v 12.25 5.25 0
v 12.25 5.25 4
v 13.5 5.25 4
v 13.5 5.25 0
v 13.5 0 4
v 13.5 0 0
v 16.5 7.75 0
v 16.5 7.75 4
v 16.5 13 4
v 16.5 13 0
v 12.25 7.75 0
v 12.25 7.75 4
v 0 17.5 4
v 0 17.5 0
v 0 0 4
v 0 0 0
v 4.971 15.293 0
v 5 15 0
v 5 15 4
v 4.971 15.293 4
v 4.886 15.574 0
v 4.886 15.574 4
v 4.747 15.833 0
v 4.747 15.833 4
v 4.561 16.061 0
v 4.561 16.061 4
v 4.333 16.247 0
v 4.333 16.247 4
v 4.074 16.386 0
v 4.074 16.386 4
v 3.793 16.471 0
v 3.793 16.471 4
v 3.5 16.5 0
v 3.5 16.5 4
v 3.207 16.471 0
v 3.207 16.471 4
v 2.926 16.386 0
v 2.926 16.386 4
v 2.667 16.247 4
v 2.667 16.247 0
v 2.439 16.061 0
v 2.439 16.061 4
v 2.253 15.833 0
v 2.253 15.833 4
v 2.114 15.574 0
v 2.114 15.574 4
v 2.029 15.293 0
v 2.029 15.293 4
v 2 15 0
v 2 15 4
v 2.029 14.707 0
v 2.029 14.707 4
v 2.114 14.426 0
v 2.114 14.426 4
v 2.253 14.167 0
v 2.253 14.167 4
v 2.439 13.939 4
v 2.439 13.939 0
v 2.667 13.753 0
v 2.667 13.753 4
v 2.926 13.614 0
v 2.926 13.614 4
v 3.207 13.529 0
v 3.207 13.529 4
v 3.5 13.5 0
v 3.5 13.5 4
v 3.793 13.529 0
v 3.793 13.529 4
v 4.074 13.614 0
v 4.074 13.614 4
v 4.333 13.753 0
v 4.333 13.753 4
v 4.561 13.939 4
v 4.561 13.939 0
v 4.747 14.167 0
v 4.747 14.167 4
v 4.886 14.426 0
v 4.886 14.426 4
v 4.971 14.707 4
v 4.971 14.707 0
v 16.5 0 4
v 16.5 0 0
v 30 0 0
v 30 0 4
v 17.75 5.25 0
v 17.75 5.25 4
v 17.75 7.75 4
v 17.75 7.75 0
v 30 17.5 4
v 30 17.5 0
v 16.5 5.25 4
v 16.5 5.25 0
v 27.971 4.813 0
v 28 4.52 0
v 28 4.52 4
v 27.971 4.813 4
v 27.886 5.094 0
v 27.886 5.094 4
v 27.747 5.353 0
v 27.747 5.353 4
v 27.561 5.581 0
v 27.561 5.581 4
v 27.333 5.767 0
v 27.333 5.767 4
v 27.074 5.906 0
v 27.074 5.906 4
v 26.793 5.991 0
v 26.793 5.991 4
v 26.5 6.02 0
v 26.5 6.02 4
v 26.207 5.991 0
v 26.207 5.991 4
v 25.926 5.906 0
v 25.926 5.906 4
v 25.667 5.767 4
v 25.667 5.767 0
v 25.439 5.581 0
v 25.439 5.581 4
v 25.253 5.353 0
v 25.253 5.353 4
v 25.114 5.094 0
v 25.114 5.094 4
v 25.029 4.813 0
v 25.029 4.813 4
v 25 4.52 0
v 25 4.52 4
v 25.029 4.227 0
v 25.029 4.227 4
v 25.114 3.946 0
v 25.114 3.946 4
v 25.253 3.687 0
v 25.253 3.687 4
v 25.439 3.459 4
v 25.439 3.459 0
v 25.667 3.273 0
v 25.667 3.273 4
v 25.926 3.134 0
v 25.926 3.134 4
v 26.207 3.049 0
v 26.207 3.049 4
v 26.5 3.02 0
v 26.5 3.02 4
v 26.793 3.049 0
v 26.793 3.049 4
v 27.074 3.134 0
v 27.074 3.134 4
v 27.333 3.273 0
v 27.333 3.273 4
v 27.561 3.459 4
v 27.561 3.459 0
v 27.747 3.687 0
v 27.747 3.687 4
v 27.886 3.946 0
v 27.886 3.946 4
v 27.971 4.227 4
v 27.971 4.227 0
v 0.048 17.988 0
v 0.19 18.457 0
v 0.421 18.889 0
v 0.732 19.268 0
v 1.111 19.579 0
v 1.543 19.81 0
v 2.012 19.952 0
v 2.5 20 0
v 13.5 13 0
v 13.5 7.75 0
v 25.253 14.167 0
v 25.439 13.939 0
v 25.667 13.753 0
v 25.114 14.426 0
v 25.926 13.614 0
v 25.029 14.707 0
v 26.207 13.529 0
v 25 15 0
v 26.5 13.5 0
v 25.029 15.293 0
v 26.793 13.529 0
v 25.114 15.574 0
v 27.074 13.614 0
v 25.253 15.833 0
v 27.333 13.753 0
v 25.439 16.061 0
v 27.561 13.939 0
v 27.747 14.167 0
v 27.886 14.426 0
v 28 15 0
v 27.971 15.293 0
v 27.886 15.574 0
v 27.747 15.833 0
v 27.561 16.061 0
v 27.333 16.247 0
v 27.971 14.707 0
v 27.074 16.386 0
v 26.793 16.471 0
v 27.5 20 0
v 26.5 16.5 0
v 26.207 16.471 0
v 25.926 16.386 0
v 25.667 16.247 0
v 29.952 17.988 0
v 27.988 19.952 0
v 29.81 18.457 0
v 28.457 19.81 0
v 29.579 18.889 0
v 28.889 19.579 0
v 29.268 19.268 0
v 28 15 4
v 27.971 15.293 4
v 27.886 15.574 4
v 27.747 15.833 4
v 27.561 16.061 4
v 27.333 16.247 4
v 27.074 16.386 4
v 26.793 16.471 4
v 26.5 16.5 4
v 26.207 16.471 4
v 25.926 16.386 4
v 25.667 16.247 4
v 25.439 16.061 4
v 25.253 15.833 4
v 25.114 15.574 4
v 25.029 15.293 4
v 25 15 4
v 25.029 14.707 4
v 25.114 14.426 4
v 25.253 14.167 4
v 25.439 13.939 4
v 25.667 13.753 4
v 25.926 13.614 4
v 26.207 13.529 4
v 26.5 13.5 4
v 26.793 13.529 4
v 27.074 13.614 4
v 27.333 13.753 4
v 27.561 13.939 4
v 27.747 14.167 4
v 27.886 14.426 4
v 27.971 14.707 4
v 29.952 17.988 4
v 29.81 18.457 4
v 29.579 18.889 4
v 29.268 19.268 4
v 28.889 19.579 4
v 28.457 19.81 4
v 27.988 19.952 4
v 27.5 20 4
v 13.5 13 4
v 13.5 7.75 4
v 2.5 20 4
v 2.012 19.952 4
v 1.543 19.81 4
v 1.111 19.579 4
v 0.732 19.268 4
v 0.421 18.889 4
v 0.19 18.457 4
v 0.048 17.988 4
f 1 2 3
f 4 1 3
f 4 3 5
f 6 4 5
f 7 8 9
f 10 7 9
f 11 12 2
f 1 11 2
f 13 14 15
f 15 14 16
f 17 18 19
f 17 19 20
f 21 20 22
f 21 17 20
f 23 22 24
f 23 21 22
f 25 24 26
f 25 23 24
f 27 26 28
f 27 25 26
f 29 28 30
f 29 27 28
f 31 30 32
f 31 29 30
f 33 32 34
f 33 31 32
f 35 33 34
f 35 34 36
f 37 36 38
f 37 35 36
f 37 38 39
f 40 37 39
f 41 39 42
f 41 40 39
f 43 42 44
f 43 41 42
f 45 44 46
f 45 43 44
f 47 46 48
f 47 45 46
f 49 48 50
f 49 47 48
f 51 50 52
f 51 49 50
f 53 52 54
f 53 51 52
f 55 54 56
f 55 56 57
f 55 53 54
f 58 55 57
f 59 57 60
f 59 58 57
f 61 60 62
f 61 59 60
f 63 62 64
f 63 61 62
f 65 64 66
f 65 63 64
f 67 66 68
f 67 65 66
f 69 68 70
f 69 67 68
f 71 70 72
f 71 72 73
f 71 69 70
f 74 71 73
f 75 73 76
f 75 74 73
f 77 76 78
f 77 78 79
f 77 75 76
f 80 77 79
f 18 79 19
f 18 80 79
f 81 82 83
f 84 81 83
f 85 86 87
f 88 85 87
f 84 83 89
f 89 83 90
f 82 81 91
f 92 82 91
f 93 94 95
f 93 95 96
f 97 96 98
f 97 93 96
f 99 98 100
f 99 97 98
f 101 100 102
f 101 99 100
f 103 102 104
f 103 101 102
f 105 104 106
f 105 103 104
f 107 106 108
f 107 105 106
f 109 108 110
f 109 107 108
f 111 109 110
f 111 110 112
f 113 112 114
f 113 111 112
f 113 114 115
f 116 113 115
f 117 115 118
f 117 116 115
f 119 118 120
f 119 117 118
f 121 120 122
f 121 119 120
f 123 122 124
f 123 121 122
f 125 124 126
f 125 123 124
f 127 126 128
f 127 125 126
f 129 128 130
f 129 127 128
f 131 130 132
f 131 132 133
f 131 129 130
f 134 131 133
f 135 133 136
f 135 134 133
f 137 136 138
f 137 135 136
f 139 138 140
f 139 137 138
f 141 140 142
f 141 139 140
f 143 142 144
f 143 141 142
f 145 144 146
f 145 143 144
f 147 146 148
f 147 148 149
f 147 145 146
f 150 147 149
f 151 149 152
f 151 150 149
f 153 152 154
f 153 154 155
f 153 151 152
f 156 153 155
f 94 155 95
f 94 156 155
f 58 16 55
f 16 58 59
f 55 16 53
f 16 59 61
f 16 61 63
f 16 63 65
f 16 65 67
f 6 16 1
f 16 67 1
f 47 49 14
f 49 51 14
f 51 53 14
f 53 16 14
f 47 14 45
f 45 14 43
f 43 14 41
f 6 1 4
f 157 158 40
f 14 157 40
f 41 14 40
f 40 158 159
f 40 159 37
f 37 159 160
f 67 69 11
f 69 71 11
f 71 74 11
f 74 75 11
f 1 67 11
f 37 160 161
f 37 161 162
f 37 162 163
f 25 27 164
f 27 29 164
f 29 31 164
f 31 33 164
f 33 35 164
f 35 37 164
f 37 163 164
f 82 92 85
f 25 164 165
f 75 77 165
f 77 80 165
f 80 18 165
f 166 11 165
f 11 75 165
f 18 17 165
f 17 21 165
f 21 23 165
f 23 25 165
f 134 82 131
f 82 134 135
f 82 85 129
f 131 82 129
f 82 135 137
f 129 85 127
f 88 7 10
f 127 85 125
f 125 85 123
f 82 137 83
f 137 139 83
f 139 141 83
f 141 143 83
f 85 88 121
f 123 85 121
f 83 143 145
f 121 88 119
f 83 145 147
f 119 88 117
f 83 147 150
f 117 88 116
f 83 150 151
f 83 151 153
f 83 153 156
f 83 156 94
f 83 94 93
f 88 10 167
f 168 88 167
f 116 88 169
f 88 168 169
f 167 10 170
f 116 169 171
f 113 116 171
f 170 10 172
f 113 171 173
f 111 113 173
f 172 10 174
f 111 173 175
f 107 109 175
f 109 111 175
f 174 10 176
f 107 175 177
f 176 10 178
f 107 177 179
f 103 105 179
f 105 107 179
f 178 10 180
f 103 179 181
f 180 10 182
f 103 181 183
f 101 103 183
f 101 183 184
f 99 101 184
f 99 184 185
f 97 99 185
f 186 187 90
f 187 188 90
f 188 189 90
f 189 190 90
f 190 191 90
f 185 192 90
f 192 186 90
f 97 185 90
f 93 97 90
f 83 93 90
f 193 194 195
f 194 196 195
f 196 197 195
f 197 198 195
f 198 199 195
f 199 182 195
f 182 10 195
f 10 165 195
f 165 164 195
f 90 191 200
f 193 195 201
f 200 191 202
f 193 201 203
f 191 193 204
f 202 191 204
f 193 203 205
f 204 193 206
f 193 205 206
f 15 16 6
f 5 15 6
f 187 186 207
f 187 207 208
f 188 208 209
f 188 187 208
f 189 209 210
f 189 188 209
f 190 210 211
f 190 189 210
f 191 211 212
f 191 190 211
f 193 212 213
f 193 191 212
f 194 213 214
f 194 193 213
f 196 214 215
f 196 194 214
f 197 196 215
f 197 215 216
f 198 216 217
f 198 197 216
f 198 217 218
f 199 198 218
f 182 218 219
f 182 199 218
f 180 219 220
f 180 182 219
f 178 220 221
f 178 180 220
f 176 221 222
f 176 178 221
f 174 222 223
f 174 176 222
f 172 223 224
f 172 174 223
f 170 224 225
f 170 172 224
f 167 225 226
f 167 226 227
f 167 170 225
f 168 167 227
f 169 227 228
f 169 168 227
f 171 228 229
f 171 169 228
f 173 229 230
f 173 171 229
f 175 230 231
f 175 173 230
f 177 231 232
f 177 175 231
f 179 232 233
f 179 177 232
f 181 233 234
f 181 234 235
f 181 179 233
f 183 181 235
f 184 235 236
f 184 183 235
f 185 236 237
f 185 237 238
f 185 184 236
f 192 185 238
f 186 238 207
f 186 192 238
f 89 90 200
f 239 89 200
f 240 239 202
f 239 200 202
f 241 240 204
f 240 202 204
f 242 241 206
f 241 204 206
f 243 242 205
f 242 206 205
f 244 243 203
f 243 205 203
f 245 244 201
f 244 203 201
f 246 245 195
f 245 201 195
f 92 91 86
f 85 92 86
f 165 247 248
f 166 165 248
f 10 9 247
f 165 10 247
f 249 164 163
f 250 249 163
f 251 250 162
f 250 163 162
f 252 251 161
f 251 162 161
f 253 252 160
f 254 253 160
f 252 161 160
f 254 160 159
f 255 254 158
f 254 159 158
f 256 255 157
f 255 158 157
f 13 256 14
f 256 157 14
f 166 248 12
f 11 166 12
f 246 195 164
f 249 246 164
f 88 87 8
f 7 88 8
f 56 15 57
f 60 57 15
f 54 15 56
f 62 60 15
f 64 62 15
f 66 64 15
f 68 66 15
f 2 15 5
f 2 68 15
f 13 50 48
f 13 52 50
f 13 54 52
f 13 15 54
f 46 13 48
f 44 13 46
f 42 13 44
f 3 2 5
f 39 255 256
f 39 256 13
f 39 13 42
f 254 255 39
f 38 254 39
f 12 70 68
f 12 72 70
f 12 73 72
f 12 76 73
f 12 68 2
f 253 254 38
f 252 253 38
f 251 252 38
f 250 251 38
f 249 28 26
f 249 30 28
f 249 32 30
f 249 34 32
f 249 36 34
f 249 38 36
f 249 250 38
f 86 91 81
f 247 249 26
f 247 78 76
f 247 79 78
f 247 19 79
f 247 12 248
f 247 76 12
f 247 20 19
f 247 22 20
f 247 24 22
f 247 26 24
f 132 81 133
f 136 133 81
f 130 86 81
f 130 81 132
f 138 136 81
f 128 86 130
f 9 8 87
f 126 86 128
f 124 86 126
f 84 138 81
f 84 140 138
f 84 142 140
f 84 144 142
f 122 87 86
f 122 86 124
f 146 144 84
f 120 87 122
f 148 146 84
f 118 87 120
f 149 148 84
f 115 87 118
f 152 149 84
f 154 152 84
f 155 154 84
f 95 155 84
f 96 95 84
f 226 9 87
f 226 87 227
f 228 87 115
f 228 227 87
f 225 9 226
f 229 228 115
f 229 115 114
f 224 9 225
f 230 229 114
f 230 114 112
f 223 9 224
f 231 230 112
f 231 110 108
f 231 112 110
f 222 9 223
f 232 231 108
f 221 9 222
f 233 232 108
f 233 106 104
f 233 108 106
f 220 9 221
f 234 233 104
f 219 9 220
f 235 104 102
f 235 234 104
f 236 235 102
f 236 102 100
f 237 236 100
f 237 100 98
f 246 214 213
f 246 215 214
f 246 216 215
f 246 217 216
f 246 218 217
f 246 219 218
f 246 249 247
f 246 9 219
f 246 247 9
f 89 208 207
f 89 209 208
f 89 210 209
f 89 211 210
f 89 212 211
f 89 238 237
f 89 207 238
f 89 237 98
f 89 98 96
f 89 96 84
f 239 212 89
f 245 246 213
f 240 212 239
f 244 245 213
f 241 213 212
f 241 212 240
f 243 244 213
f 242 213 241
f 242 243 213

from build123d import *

# Parameters (mm, degrees)
SKETCH_1_R               = 1.5
EXTRUDE_1_DEPTH          = 4
CUT_EXTRUDE_1_DEPTH      = 1
CUT_EXTRUDE_1_DEPTH_BACK = 4


with BuildPart() as part:
    # Эскиз1 → Бобышка-Вытянуть1 (new body)
    with BuildSketch(Plane.XY):
        with BuildLine():
            Line((0, 0), (30, 0))
            Line((30, 0), (30, 17.5))
            ThreePointArc((30, 17.5), (29.267766953, 19.267766953), (27.5, 20))
            Line((27.5, 20), (2.5, 20))
            ThreePointArc((2.5, 20), (0.732233047, 19.267766953), (0, 17.5))
            Line((0, 17.5), (0, 0))
        make_face()
        with Locations((3.5, 15)):
            Circle(SKETCH_1_R, mode=Mode.SUBTRACT)
        with Locations((26.5, 15)):
            Circle(SKETCH_1_R, mode=Mode.SUBTRACT)
        with Locations((26.5, 4.52)):
            Circle(SKETCH_1_R, mode=Mode.SUBTRACT)
    extrude(amount=EXTRUDE_1_DEPTH)

    # Эскиз2 → Вырез-Вытянуть1 (cut, two sides)
    with BuildSketch(Plane.XY.offset(4)) as cut_extrude_1_sk:
        Polygon((13.5, 5.25), (13.5, 0), (16.5, 0), (16.5, 5.25), (17.75, 5.25), (17.75, 7.75), (16.5, 7.75), (16.5, 13), (13.5, 13), (13.5, 7.75), (12.25, 7.75), (12.25, 5.25), align=None)
    extrude(amount=CUT_EXTRUDE_1_DEPTH, mode=Mode.SUBTRACT)
    extrude(cut_extrude_1_sk.sketch, amount=-CUT_EXTRUDE_1_DEPTH_BACK, mode=Mode.SUBTRACT)


solid = part.part
